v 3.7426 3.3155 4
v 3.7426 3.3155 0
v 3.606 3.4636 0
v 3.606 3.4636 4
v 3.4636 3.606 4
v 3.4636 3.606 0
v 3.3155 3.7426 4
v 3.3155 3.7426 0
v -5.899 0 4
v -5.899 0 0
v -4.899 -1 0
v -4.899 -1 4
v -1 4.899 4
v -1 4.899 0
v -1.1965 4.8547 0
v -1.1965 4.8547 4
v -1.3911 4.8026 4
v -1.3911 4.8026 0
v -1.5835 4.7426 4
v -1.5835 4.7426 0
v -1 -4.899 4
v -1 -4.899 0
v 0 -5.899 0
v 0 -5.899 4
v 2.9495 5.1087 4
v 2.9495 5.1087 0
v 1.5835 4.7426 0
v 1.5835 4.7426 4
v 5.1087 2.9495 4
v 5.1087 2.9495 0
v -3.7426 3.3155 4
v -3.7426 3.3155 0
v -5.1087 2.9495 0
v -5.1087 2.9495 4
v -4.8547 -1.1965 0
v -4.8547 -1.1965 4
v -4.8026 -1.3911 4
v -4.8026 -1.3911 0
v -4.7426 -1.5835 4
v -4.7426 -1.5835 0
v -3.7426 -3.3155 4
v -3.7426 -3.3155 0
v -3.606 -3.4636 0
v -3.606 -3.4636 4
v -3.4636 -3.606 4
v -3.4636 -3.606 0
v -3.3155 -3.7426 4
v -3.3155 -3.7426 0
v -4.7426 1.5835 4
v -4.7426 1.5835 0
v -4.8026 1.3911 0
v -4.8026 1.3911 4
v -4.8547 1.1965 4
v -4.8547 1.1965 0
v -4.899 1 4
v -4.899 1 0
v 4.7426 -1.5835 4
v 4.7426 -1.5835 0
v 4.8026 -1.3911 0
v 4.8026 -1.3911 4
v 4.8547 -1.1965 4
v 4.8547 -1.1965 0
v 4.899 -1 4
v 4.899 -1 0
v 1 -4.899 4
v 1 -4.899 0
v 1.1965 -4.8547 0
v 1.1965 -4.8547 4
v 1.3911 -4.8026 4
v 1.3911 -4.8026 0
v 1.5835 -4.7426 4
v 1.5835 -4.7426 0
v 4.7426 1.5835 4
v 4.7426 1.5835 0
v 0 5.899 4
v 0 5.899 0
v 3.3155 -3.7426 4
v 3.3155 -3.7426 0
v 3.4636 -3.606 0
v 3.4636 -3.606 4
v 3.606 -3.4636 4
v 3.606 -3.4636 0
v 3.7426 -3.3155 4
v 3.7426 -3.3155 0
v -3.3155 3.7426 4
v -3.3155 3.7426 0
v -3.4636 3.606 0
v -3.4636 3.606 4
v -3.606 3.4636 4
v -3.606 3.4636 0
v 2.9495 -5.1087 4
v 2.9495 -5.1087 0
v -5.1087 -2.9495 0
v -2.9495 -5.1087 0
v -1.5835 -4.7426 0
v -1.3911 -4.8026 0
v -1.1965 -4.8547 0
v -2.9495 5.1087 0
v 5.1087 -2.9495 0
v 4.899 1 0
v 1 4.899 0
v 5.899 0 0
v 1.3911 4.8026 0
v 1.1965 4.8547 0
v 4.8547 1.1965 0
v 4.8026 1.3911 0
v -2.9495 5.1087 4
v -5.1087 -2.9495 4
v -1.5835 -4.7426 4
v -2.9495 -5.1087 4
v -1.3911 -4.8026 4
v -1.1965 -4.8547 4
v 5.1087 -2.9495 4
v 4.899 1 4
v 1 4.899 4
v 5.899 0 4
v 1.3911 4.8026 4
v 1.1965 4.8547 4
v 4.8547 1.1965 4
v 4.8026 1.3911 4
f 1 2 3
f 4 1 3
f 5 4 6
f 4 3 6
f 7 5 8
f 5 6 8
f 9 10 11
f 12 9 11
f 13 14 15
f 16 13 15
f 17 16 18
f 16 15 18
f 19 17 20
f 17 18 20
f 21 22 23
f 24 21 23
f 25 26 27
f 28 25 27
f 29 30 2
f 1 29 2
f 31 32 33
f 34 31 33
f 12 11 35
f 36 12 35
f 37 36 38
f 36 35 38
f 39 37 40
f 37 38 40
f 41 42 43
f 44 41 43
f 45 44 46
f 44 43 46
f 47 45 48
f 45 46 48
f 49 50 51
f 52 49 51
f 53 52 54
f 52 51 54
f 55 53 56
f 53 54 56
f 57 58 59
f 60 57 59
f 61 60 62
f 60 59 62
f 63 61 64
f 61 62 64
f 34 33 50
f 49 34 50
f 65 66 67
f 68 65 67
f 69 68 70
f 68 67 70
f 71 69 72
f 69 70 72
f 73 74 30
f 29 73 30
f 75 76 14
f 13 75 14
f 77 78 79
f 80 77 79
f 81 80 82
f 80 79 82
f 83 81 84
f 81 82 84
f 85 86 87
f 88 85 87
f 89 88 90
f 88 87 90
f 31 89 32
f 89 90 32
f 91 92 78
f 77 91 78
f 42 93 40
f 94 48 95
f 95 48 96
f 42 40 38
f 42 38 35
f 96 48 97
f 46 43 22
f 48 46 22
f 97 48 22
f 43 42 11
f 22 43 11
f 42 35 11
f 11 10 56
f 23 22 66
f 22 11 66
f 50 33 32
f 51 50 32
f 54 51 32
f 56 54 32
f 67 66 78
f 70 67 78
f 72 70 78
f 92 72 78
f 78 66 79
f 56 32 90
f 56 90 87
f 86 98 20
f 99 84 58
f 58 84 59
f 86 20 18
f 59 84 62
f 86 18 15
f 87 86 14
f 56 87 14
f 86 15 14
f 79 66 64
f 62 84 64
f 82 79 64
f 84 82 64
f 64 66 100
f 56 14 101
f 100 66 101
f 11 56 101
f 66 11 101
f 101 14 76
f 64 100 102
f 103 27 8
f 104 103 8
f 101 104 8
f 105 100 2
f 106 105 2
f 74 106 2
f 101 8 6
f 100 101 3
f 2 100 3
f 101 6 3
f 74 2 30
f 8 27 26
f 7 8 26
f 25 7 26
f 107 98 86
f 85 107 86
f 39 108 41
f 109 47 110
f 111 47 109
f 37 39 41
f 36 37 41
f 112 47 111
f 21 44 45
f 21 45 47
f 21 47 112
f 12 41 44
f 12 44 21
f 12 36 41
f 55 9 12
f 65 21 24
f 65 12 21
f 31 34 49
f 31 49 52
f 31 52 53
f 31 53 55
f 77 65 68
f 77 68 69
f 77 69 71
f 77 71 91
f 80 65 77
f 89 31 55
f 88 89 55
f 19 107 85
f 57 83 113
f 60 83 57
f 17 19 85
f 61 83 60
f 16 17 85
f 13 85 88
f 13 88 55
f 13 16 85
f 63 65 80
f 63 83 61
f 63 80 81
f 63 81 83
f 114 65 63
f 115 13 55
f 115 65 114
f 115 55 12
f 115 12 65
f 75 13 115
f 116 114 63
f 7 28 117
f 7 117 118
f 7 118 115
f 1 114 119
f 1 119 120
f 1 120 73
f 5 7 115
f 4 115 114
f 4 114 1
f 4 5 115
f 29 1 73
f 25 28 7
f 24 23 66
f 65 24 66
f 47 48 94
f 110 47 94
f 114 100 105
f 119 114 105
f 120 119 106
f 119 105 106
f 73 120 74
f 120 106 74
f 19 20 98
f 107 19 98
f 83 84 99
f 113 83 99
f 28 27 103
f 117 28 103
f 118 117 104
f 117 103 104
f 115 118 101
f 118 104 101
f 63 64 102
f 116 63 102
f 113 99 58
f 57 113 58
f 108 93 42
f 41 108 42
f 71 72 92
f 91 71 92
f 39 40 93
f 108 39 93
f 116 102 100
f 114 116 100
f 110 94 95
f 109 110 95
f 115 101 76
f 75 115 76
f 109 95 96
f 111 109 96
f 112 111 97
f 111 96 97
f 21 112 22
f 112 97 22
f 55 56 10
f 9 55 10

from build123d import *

# Parameters (mm, degrees)
F1_DEPTH = 4


with BuildPart() as f1:
    # F0 (on Top) → F1 (new body)
    with BuildSketch(Plane.XY):
        with BuildLine():
            ThreePointArc((4.898979, -1), (4.974681, -0.502545), (5, 0))
            ThreePointArc((5, 0), (4.974681, 0.502545), (4.898979, 1))
            ThreePointArc((4.898979, 1), (4.829629, 1.294095), (4.742641, 1.583464))
            ThreePointArc((4.742641, 1.583464), (4.330127, 2.5), (3.742641, 3.315515))
            ThreePointArc((3.742641, 3.315515), (3.535534, 3.535534), (3.315515, 3.742641))
            ThreePointArc((3.315515, 3.742641), (2.5, 4.330127), (1.583464, 4.742641))
            ThreePointArc((1.583464, 4.742641), (1.294095, 4.829629), (1, 4.898979))
            Line((1, 4.898979), (-1, 4.898979))
            ThreePointArc((-1, 4.898979), (-1.294095, 4.829629), (-1.583464, 4.742641))
            ThreePointArc((-1.583464, 4.742641), (-2.5, 4.330127), (-3.315515, 3.742641))
            ThreePointArc((-3.315515, 3.742641), (-3.535534, 3.535534), (-3.742641, 3.315515))
            ThreePointArc((-3.742641, 3.315515), (-4.330127, 2.5), (-4.742641, 1.583464))
            ThreePointArc((-4.742641, 1.583464), (-4.829629, 1.294095), (-4.898979, 1))
            ThreePointArc((-4.898979, 1), (-5, 0), (-4.898979, -1))
            ThreePointArc((-4.898979, -1), (-4.829629, -1.294095), (-4.742641, -1.583464))
            ThreePointArc((-4.742641, -1.583464), (-4.330127, -2.5), (-3.742641, -3.315515))
            ThreePointArc((-3.742641, -3.315515), (-3.535534, -3.535534), (-3.315515, -3.742641))
            ThreePointArc((-3.315515, -3.742641), (-2.5, -4.330127), (-1.583464, -4.742641))
            ThreePointArc((-1.583464, -4.742641), (-1.294095, -4.829629), (-1, -4.898979))
            ThreePointArc((-1, -4.898979), (0, -5), (1, -4.898979))
            ThreePointArc((1, -4.898979), (1.294095, -4.829629), (1.583464, -4.742641))
            ThreePointArc((1.583464, -4.742641), (2.5, -4.330127), (3.315515, -3.742641))
            ThreePointArc((3.315515, -3.742641), (3.535534, -3.535534), (3.742641, -3.315515))
            ThreePointArc((3.742641, -3.315515), (4.330127, -2.5), (4.742641, -1.583464))
            ThreePointArc((4.742641, -1.583464), (4.829629, -1.294095), (4.898979, -1))
        make_face()
        with BuildLine():
            Line((-1, 4.898979), (1, 4.898979))
            ThreePointArc((1, 4.898979), (0, 5), (-1, 4.898979))
        make_face()
        with BuildLine():
            ThreePointArc((-3.315515, 3.742641), (-2.5, 4.330127), (-1.583464, 4.742641))
            Line((-1.583464, 4.742641), (-2.94949, 5.108666))
            Line((-2.94949, 5.108666), (-3.315515, 3.742641))
        make_face()
        with BuildLine():
            ThreePointArc((-1, 4.898979), (0, 5), (1, 4.898979))
            Line((1, 4.898979), (0, 5.898979))
            Line((0, 5.898979), (-1, 4.898979))
        make_face()
        with BuildLine():
            ThreePointArc((1.583464, 4.742641), (2.5, 4.330127), (3.315515, 3.742641))
            Line((3.315515, 3.742641), (2.94949, 5.108666))
            Line((2.94949, 5.108666), (1.583464, 4.742641))
        make_face()
        with BuildLine():
            ThreePointArc((3.742641, 3.315515), (4.330127, 2.5), (4.742641, 1.583464))
            Line((4.742641, 1.583464), (5.108666, 2.94949))
            Line((5.108666, 2.94949), (3.742641, 3.315515))
        make_face()
        with BuildLine():
            ThreePointArc((4.898979, 1), (4.974681, 0.502545), (5, 0))
            ThreePointArc((5, 0), (4.974681, -0.502545), (4.898979, -1))
            Line((4.898979, -1), (5.898979, 0))
            Line((5.898979, 0), (4.898979, 1))
        make_face()
        with BuildLine():
            Line((5.108666, -2.94949), (4.742641, -1.583464))
            ThreePointArc((4.742641, -1.583464), (4.330127, -2.5), (3.742641, -3.315515))
            Line((3.742641, -3.315515), (5.108666, -2.94949))
        make_face()
        with BuildLine():
            Line((2.94949, -5.108666), (3.315515, -3.742641))
            ThreePointArc((3.315515, -3.742641), (2.5, -4.330127), (1.583464, -4.742641))
            Line((1.583464, -4.742641), (2.94949, -5.108666))
        make_face()
        with BuildLine():
            Line((0, -5.898979), (1, -4.898979))
            ThreePointArc((1, -4.898979), (0, -5), (-1, -4.898979))
            Line((-1, -4.898979), (0, -5.898979))
        make_face()
        with BuildLine():
            Line((-2.94949, -5.108666), (-1.583464, -4.742641))
            ThreePointArc((-1.583464, -4.742641), (-2.5, -4.330127), (-3.315515, -3.742641))
            Line((-3.315515, -3.742641), (-2.94949, -5.108666))
        make_face()
        with BuildLine():
            Line((-5.108666, -2.94949), (-3.742641, -3.315515))
            ThreePointArc((-3.742641, -3.315515), (-4.330127, -2.5), (-4.742641, -1.583464))
            Line((-4.742641, -1.583464), (-5.108666, -2.94949))
        make_face()
        with BuildLine():
            ThreePointArc((-4.898979, -1), (-5, 0), (-4.898979, 1))
            Line((-4.898979, 1), (-5.898979, 0))
            Line((-5.898979, 0), (-4.898979, -1))
        make_face()
        with BuildLine():
            ThreePointArc((-4.742641, 1.583464), (-4.330127, 2.5), (-3.742641, 3.315515))
            Line((-3.742641, 3.315515), (-5.108666, 2.94949))
            Line((-5.108666, 2.94949), (-4.742641, 1.583464))
        make_face()
    extrude(amount=F1_DEPTH)


solid = f1.part
